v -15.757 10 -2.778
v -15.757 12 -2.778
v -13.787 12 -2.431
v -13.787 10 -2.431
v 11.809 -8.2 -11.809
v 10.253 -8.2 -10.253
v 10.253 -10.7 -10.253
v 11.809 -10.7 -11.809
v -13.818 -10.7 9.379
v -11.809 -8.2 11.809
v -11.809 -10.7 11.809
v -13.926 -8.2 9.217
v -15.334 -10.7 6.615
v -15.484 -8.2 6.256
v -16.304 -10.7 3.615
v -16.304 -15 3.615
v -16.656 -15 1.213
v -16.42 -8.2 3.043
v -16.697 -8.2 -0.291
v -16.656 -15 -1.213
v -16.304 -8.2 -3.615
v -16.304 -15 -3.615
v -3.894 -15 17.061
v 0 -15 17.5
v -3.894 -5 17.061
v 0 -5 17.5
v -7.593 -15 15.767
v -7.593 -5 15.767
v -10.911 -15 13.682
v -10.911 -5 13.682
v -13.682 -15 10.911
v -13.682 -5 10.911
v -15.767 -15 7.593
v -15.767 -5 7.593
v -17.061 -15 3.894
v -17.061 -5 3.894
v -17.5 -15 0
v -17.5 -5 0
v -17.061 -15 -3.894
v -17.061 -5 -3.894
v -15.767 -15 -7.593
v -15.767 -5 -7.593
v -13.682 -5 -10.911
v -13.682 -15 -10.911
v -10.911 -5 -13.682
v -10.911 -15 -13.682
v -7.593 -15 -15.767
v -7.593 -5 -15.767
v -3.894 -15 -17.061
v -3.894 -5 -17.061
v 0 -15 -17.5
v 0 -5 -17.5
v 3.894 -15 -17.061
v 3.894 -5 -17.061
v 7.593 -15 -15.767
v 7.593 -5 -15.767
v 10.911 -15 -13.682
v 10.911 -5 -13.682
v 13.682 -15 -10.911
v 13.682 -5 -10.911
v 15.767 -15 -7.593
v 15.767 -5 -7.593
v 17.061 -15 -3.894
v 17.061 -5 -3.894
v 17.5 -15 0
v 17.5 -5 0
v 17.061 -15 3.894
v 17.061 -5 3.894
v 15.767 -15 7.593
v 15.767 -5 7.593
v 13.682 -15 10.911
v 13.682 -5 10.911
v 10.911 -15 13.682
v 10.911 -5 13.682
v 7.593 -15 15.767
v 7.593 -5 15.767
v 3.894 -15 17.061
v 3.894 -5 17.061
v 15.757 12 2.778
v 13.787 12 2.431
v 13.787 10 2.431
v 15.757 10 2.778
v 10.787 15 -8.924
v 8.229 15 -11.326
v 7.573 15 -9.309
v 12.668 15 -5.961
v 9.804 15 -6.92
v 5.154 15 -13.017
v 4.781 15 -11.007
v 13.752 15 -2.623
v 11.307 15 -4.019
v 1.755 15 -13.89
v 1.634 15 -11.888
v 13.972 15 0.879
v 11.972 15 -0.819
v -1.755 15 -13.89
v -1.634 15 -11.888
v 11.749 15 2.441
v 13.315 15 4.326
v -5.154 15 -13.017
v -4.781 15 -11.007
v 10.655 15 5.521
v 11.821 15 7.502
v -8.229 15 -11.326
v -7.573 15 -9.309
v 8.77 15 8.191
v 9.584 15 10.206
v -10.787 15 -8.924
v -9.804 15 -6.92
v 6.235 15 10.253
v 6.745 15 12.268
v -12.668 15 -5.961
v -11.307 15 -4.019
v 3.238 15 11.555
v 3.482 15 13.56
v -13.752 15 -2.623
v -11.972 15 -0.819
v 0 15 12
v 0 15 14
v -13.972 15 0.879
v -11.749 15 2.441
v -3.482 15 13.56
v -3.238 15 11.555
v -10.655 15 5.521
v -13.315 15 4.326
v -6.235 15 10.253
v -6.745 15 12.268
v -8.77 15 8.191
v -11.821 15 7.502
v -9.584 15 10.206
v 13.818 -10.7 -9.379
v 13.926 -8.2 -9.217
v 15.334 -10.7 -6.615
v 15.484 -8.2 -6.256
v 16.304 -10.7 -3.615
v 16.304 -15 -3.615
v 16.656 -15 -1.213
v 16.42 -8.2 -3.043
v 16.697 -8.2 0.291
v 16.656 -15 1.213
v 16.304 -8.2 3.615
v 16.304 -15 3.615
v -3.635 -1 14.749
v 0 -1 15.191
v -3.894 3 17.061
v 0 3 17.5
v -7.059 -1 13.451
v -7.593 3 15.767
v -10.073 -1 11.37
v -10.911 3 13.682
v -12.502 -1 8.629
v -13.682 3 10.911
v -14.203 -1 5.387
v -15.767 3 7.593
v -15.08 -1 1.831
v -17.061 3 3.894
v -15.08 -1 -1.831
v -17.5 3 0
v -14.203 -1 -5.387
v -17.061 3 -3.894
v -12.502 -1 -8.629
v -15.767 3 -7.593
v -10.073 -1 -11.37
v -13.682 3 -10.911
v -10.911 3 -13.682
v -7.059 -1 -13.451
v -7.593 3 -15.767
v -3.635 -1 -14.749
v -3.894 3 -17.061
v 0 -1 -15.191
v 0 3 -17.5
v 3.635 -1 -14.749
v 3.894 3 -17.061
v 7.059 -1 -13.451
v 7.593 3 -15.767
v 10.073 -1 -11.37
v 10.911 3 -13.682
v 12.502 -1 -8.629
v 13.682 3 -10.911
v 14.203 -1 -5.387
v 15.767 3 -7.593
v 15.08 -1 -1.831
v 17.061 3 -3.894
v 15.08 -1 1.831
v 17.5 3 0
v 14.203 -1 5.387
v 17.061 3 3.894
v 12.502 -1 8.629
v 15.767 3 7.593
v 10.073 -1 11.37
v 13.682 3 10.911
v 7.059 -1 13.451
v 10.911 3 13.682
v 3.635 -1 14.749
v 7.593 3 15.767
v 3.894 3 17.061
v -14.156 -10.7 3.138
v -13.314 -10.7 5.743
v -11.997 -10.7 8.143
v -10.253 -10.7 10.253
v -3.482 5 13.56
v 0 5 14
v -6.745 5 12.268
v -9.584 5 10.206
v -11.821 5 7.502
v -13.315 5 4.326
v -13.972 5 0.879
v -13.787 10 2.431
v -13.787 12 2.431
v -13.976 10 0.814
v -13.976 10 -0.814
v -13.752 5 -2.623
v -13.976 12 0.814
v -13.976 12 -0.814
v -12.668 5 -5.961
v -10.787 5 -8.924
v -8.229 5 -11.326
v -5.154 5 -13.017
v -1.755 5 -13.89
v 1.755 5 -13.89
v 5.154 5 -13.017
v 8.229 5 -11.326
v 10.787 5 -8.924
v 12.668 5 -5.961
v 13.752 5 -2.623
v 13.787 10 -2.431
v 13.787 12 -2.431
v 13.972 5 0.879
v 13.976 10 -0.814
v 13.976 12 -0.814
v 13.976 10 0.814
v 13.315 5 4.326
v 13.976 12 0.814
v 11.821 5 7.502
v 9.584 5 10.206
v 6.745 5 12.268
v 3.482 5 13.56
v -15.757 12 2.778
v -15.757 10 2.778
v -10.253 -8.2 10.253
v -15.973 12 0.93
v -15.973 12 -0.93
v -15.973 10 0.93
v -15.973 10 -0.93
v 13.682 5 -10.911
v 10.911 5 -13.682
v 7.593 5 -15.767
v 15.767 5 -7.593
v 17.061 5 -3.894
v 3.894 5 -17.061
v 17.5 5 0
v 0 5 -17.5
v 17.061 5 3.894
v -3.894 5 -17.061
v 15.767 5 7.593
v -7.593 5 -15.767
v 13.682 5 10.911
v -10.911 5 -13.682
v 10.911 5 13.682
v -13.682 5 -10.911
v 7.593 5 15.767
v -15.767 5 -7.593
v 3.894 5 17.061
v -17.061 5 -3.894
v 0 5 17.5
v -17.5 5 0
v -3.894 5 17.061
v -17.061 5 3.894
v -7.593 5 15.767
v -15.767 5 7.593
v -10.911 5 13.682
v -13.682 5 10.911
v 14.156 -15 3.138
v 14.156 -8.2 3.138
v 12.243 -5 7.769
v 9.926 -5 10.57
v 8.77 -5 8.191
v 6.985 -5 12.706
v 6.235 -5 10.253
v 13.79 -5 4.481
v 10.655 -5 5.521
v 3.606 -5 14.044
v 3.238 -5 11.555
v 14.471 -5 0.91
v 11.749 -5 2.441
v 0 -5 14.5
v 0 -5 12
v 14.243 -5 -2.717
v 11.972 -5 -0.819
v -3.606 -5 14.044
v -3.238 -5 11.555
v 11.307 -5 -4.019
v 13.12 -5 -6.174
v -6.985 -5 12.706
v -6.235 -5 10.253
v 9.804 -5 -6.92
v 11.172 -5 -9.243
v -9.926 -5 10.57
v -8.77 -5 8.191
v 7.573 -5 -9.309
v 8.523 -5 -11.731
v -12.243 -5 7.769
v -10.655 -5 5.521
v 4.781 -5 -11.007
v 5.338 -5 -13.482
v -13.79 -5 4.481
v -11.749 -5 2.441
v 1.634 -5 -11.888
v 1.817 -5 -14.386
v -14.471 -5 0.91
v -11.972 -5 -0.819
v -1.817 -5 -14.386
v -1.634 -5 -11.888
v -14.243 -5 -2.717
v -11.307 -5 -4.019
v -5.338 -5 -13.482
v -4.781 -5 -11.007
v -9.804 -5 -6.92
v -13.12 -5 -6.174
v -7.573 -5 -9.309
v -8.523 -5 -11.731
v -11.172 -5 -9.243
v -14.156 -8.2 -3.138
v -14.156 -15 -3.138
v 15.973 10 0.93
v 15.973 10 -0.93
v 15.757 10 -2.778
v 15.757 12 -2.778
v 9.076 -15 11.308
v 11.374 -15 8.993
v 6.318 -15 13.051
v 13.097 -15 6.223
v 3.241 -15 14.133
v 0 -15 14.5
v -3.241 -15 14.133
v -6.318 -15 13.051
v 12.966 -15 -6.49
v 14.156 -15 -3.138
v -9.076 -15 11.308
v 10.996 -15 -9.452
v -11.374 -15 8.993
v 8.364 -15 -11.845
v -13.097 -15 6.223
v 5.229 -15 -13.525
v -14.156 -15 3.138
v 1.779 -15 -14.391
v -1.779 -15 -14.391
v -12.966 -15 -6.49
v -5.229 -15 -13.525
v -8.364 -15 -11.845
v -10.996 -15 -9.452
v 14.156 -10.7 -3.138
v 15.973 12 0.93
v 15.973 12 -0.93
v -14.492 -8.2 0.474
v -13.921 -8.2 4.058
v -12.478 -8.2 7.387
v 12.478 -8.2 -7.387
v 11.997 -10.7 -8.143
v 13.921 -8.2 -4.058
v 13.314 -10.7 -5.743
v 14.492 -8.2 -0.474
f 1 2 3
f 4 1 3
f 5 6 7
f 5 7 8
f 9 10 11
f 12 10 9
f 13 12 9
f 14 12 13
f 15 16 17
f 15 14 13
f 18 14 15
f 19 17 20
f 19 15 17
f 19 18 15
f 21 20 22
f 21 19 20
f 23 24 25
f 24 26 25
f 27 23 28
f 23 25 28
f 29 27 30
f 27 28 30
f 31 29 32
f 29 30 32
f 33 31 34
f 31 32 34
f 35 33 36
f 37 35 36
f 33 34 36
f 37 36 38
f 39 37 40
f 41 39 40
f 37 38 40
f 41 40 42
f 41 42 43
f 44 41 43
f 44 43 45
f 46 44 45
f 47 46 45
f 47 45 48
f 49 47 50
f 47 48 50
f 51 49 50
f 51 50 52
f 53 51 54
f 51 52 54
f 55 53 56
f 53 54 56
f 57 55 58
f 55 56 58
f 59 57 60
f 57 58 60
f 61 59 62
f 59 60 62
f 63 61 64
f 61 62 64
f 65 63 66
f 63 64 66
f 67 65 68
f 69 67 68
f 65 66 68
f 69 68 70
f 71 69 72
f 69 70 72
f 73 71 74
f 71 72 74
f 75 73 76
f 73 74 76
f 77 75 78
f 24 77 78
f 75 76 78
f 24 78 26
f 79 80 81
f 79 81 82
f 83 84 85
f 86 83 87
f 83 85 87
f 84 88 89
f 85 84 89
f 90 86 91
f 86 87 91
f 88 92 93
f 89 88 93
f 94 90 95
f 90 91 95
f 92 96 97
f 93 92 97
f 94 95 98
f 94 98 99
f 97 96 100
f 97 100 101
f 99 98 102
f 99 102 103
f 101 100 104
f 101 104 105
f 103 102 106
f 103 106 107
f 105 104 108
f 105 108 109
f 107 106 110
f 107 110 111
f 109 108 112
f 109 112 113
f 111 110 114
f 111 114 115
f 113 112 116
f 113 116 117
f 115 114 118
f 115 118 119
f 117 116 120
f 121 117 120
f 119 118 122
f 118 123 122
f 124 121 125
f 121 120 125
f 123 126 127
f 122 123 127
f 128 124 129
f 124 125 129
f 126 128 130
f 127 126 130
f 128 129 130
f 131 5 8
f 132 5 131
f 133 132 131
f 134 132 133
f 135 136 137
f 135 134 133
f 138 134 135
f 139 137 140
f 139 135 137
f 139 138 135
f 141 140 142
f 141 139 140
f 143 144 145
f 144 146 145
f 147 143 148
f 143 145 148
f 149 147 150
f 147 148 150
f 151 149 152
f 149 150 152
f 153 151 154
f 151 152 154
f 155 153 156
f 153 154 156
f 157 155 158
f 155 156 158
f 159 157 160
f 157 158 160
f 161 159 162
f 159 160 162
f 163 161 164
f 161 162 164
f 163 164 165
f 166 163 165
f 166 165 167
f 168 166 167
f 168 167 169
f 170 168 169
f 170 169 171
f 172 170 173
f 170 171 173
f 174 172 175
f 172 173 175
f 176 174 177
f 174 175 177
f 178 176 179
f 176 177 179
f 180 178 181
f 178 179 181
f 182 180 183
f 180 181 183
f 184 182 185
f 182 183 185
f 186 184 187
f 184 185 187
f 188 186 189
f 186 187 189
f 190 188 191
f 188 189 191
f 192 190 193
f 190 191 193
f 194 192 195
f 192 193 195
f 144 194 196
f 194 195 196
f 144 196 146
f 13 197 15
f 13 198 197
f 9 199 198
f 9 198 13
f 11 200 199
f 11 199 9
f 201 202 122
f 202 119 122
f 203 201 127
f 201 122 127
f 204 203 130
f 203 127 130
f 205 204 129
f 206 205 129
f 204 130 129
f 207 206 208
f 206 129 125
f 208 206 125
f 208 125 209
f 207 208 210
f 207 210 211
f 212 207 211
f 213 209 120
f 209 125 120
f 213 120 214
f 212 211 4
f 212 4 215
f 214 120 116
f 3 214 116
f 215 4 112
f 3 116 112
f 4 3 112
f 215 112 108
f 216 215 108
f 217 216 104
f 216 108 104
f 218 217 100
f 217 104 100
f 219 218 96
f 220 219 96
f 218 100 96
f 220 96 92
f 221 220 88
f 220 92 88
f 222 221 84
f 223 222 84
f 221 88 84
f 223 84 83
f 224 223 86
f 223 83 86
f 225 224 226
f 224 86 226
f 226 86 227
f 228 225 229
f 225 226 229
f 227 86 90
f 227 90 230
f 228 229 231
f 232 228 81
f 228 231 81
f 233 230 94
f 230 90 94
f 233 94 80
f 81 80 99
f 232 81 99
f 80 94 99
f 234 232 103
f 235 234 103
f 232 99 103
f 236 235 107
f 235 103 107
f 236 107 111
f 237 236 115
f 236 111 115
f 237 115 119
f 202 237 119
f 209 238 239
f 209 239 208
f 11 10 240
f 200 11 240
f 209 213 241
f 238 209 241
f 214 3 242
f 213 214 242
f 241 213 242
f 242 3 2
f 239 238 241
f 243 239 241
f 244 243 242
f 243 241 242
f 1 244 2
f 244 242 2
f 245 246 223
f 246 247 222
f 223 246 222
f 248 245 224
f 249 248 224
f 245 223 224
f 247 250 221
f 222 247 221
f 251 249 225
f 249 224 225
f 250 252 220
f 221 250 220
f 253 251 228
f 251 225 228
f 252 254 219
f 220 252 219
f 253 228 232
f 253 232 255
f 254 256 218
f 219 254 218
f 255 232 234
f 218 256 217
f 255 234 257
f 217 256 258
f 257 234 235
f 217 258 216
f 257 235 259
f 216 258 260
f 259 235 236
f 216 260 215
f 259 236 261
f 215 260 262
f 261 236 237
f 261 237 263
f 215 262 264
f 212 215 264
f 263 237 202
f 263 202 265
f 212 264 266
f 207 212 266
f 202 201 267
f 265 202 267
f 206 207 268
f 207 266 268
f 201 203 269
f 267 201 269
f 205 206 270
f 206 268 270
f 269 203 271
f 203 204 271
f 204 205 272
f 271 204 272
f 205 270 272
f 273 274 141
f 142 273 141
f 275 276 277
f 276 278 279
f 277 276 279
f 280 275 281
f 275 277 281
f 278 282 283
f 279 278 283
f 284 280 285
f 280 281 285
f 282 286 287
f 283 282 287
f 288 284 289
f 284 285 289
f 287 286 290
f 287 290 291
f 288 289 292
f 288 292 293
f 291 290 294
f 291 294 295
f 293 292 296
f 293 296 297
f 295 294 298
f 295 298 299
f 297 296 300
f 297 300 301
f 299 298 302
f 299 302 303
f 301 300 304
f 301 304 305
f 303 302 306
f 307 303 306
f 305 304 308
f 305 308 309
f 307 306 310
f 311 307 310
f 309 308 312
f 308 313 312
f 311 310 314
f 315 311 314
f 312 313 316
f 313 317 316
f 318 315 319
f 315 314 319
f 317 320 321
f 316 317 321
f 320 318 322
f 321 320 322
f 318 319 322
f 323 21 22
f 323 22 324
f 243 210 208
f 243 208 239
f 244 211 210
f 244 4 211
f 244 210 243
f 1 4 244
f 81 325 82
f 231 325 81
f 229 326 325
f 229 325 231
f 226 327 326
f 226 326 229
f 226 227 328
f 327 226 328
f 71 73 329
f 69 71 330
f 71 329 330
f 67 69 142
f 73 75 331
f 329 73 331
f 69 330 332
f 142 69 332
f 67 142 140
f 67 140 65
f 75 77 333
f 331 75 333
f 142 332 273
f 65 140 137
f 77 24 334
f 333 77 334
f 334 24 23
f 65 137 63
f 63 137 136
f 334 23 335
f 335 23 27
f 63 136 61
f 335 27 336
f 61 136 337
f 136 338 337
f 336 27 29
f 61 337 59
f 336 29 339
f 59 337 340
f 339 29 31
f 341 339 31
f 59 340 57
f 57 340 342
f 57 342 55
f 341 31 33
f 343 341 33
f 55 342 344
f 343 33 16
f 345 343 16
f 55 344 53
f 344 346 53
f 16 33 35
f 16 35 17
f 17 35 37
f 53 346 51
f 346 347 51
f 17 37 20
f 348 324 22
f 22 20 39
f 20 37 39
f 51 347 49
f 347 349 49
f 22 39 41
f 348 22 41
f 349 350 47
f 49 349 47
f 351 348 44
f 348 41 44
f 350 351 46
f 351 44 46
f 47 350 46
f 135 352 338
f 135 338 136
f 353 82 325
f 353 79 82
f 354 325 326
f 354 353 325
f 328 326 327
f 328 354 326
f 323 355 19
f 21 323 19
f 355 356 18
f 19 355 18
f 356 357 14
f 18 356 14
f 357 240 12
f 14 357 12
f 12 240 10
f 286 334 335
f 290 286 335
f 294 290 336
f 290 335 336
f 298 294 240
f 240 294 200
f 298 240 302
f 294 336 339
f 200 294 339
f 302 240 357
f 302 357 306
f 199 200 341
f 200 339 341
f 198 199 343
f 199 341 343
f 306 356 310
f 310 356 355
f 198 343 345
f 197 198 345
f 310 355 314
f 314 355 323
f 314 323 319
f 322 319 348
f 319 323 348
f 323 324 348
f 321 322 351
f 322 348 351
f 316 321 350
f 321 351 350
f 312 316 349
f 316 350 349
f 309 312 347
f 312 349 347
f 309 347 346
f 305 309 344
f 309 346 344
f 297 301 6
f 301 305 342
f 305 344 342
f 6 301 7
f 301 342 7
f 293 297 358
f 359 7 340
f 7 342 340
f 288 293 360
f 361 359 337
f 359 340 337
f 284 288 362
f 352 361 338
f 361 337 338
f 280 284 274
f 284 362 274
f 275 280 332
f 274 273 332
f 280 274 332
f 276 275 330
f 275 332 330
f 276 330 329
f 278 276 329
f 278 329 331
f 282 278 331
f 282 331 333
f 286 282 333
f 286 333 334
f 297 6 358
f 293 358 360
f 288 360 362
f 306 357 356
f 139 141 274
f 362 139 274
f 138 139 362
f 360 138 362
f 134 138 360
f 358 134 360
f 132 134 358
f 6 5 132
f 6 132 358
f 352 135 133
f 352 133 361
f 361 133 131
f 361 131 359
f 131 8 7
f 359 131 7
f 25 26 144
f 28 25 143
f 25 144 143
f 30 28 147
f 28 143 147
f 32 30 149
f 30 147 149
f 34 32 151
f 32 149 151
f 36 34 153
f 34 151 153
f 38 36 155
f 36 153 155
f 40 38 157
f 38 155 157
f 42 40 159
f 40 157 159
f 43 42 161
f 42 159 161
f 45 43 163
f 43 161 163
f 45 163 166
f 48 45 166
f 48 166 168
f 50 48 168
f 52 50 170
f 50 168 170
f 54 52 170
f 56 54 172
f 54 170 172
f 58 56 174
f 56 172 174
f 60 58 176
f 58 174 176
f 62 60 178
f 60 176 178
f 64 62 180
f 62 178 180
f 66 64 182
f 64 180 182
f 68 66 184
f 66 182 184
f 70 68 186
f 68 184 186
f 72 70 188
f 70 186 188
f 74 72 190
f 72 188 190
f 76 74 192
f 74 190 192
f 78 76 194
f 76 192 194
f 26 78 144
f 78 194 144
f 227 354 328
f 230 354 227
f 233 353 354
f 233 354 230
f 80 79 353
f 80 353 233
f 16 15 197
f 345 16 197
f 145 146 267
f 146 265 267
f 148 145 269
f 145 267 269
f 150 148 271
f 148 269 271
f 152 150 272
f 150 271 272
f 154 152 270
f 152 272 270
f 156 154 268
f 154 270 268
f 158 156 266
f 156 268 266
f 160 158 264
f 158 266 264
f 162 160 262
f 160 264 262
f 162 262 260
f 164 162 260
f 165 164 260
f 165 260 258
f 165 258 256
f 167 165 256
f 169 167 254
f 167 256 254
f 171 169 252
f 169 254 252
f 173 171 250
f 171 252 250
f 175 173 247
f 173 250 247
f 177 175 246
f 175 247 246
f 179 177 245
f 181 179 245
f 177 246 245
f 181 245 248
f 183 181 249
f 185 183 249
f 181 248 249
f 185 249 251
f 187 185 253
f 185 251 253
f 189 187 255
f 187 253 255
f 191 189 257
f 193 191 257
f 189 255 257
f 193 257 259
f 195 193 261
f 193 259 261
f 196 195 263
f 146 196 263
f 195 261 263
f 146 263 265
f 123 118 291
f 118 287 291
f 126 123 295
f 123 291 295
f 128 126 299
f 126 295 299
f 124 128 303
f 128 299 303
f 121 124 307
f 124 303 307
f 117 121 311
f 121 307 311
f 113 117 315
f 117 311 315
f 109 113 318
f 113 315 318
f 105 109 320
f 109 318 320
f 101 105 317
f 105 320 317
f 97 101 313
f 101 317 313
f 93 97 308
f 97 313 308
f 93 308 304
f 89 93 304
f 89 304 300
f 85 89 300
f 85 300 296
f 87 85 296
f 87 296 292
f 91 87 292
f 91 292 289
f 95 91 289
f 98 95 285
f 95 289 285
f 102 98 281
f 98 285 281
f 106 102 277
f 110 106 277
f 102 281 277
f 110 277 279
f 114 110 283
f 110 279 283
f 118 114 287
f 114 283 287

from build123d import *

# Parameters (mm, degrees)
SKETCH2_W          = 2
SKETCH2_H          = 2
REVOLVE2_ANGLE     = 20
SKETCH3_W          = 2.2
SKETCH3_H          = 6.8
CUT_REVOLVE1_ANGLE = 25
SKETCH4_W          = 4.7
SKETCH4_H          = 2.5
CUT_REVOLVE2_ANGLE = 45


with BuildPart() as part:
    # Sketch1 → Revolve1 (revolve)
    with BuildSketch(Plane.XY, mode=Mode.PRIVATE) as revolve1_sk:
        Polygon((12, 15), (12, -5), (14.5, -5), (14.5, -15), (17.5, -15), (17.5, -5), (15.190598923, -1), (17.5, 3), (17.5, 5), (14, 5), (14, 15), align=None)
    revolve(revolve1_sk.sketch.rotate(Axis((0, 40.467735012, 0), (0, -1, 0)), 90), axis=Axis((0, 40.467735012, 0), (0, -1, 0)))

    # Sketch2 → Revolve2 (revolve, symmetric)
    with BuildSketch(Plane.XY) as revolve2_sk:
        with Locations((15, 11)):
            Rectangle(SKETCH2_W, SKETCH2_H)
        with Locations((-15, 11)):
            Rectangle(SKETCH2_W, SKETCH2_H)
    revolve(axis=Axis((0, 45.306661743, 0), (0, -1, 0)), revolution_arc=REVOLVE2_ANGLE / 2)
    revolve(revolve2_sk.sketch, axis=Axis((0, 45.306661743, 0), (0, 1, 0)), revolution_arc=REVOLVE2_ANGLE / 2)

    # Sketch3 → Cut-Revolve1 (revolve, symmetric, cut)
    with BuildSketch(Plane.XY) as cut_revolve1_sk:
        with Locations((-15.6, -11.6)):
            Rectangle(SKETCH3_W, SKETCH3_H)
        with Locations((15.6, -11.6)):
            Rectangle(SKETCH3_W, SKETCH3_H)
    revolve(axis=Axis((0, -11.020729768, 0), (0, -1, 0)), revolution_arc=CUT_REVOLVE1_ANGLE / 2, mode=Mode.SUBTRACT)
    revolve(cut_revolve1_sk.sketch, axis=Axis((0, -11.020729768, 0), (0, 1, 0)), revolution_arc=CUT_REVOLVE1_ANGLE / 2, mode=Mode.SUBTRACT)

    # Sketch4 → Cut-Revolve2 (revolve, cut)
    with BuildSketch(Plane.XY):
        with Locations((-14.35, -9.45)):
            Rectangle(SKETCH4_W, SKETCH4_H)
        with Locations((14.35, -9.45)):
            Rectangle(SKETCH4_W, SKETCH4_H)
    revolve(axis=Axis((0, -42.004114959, 0), (0, 1, 0)), revolution_arc=CUT_REVOLVE2_ANGLE, mode=Mode.SUBTRACT)


solid = part.part
